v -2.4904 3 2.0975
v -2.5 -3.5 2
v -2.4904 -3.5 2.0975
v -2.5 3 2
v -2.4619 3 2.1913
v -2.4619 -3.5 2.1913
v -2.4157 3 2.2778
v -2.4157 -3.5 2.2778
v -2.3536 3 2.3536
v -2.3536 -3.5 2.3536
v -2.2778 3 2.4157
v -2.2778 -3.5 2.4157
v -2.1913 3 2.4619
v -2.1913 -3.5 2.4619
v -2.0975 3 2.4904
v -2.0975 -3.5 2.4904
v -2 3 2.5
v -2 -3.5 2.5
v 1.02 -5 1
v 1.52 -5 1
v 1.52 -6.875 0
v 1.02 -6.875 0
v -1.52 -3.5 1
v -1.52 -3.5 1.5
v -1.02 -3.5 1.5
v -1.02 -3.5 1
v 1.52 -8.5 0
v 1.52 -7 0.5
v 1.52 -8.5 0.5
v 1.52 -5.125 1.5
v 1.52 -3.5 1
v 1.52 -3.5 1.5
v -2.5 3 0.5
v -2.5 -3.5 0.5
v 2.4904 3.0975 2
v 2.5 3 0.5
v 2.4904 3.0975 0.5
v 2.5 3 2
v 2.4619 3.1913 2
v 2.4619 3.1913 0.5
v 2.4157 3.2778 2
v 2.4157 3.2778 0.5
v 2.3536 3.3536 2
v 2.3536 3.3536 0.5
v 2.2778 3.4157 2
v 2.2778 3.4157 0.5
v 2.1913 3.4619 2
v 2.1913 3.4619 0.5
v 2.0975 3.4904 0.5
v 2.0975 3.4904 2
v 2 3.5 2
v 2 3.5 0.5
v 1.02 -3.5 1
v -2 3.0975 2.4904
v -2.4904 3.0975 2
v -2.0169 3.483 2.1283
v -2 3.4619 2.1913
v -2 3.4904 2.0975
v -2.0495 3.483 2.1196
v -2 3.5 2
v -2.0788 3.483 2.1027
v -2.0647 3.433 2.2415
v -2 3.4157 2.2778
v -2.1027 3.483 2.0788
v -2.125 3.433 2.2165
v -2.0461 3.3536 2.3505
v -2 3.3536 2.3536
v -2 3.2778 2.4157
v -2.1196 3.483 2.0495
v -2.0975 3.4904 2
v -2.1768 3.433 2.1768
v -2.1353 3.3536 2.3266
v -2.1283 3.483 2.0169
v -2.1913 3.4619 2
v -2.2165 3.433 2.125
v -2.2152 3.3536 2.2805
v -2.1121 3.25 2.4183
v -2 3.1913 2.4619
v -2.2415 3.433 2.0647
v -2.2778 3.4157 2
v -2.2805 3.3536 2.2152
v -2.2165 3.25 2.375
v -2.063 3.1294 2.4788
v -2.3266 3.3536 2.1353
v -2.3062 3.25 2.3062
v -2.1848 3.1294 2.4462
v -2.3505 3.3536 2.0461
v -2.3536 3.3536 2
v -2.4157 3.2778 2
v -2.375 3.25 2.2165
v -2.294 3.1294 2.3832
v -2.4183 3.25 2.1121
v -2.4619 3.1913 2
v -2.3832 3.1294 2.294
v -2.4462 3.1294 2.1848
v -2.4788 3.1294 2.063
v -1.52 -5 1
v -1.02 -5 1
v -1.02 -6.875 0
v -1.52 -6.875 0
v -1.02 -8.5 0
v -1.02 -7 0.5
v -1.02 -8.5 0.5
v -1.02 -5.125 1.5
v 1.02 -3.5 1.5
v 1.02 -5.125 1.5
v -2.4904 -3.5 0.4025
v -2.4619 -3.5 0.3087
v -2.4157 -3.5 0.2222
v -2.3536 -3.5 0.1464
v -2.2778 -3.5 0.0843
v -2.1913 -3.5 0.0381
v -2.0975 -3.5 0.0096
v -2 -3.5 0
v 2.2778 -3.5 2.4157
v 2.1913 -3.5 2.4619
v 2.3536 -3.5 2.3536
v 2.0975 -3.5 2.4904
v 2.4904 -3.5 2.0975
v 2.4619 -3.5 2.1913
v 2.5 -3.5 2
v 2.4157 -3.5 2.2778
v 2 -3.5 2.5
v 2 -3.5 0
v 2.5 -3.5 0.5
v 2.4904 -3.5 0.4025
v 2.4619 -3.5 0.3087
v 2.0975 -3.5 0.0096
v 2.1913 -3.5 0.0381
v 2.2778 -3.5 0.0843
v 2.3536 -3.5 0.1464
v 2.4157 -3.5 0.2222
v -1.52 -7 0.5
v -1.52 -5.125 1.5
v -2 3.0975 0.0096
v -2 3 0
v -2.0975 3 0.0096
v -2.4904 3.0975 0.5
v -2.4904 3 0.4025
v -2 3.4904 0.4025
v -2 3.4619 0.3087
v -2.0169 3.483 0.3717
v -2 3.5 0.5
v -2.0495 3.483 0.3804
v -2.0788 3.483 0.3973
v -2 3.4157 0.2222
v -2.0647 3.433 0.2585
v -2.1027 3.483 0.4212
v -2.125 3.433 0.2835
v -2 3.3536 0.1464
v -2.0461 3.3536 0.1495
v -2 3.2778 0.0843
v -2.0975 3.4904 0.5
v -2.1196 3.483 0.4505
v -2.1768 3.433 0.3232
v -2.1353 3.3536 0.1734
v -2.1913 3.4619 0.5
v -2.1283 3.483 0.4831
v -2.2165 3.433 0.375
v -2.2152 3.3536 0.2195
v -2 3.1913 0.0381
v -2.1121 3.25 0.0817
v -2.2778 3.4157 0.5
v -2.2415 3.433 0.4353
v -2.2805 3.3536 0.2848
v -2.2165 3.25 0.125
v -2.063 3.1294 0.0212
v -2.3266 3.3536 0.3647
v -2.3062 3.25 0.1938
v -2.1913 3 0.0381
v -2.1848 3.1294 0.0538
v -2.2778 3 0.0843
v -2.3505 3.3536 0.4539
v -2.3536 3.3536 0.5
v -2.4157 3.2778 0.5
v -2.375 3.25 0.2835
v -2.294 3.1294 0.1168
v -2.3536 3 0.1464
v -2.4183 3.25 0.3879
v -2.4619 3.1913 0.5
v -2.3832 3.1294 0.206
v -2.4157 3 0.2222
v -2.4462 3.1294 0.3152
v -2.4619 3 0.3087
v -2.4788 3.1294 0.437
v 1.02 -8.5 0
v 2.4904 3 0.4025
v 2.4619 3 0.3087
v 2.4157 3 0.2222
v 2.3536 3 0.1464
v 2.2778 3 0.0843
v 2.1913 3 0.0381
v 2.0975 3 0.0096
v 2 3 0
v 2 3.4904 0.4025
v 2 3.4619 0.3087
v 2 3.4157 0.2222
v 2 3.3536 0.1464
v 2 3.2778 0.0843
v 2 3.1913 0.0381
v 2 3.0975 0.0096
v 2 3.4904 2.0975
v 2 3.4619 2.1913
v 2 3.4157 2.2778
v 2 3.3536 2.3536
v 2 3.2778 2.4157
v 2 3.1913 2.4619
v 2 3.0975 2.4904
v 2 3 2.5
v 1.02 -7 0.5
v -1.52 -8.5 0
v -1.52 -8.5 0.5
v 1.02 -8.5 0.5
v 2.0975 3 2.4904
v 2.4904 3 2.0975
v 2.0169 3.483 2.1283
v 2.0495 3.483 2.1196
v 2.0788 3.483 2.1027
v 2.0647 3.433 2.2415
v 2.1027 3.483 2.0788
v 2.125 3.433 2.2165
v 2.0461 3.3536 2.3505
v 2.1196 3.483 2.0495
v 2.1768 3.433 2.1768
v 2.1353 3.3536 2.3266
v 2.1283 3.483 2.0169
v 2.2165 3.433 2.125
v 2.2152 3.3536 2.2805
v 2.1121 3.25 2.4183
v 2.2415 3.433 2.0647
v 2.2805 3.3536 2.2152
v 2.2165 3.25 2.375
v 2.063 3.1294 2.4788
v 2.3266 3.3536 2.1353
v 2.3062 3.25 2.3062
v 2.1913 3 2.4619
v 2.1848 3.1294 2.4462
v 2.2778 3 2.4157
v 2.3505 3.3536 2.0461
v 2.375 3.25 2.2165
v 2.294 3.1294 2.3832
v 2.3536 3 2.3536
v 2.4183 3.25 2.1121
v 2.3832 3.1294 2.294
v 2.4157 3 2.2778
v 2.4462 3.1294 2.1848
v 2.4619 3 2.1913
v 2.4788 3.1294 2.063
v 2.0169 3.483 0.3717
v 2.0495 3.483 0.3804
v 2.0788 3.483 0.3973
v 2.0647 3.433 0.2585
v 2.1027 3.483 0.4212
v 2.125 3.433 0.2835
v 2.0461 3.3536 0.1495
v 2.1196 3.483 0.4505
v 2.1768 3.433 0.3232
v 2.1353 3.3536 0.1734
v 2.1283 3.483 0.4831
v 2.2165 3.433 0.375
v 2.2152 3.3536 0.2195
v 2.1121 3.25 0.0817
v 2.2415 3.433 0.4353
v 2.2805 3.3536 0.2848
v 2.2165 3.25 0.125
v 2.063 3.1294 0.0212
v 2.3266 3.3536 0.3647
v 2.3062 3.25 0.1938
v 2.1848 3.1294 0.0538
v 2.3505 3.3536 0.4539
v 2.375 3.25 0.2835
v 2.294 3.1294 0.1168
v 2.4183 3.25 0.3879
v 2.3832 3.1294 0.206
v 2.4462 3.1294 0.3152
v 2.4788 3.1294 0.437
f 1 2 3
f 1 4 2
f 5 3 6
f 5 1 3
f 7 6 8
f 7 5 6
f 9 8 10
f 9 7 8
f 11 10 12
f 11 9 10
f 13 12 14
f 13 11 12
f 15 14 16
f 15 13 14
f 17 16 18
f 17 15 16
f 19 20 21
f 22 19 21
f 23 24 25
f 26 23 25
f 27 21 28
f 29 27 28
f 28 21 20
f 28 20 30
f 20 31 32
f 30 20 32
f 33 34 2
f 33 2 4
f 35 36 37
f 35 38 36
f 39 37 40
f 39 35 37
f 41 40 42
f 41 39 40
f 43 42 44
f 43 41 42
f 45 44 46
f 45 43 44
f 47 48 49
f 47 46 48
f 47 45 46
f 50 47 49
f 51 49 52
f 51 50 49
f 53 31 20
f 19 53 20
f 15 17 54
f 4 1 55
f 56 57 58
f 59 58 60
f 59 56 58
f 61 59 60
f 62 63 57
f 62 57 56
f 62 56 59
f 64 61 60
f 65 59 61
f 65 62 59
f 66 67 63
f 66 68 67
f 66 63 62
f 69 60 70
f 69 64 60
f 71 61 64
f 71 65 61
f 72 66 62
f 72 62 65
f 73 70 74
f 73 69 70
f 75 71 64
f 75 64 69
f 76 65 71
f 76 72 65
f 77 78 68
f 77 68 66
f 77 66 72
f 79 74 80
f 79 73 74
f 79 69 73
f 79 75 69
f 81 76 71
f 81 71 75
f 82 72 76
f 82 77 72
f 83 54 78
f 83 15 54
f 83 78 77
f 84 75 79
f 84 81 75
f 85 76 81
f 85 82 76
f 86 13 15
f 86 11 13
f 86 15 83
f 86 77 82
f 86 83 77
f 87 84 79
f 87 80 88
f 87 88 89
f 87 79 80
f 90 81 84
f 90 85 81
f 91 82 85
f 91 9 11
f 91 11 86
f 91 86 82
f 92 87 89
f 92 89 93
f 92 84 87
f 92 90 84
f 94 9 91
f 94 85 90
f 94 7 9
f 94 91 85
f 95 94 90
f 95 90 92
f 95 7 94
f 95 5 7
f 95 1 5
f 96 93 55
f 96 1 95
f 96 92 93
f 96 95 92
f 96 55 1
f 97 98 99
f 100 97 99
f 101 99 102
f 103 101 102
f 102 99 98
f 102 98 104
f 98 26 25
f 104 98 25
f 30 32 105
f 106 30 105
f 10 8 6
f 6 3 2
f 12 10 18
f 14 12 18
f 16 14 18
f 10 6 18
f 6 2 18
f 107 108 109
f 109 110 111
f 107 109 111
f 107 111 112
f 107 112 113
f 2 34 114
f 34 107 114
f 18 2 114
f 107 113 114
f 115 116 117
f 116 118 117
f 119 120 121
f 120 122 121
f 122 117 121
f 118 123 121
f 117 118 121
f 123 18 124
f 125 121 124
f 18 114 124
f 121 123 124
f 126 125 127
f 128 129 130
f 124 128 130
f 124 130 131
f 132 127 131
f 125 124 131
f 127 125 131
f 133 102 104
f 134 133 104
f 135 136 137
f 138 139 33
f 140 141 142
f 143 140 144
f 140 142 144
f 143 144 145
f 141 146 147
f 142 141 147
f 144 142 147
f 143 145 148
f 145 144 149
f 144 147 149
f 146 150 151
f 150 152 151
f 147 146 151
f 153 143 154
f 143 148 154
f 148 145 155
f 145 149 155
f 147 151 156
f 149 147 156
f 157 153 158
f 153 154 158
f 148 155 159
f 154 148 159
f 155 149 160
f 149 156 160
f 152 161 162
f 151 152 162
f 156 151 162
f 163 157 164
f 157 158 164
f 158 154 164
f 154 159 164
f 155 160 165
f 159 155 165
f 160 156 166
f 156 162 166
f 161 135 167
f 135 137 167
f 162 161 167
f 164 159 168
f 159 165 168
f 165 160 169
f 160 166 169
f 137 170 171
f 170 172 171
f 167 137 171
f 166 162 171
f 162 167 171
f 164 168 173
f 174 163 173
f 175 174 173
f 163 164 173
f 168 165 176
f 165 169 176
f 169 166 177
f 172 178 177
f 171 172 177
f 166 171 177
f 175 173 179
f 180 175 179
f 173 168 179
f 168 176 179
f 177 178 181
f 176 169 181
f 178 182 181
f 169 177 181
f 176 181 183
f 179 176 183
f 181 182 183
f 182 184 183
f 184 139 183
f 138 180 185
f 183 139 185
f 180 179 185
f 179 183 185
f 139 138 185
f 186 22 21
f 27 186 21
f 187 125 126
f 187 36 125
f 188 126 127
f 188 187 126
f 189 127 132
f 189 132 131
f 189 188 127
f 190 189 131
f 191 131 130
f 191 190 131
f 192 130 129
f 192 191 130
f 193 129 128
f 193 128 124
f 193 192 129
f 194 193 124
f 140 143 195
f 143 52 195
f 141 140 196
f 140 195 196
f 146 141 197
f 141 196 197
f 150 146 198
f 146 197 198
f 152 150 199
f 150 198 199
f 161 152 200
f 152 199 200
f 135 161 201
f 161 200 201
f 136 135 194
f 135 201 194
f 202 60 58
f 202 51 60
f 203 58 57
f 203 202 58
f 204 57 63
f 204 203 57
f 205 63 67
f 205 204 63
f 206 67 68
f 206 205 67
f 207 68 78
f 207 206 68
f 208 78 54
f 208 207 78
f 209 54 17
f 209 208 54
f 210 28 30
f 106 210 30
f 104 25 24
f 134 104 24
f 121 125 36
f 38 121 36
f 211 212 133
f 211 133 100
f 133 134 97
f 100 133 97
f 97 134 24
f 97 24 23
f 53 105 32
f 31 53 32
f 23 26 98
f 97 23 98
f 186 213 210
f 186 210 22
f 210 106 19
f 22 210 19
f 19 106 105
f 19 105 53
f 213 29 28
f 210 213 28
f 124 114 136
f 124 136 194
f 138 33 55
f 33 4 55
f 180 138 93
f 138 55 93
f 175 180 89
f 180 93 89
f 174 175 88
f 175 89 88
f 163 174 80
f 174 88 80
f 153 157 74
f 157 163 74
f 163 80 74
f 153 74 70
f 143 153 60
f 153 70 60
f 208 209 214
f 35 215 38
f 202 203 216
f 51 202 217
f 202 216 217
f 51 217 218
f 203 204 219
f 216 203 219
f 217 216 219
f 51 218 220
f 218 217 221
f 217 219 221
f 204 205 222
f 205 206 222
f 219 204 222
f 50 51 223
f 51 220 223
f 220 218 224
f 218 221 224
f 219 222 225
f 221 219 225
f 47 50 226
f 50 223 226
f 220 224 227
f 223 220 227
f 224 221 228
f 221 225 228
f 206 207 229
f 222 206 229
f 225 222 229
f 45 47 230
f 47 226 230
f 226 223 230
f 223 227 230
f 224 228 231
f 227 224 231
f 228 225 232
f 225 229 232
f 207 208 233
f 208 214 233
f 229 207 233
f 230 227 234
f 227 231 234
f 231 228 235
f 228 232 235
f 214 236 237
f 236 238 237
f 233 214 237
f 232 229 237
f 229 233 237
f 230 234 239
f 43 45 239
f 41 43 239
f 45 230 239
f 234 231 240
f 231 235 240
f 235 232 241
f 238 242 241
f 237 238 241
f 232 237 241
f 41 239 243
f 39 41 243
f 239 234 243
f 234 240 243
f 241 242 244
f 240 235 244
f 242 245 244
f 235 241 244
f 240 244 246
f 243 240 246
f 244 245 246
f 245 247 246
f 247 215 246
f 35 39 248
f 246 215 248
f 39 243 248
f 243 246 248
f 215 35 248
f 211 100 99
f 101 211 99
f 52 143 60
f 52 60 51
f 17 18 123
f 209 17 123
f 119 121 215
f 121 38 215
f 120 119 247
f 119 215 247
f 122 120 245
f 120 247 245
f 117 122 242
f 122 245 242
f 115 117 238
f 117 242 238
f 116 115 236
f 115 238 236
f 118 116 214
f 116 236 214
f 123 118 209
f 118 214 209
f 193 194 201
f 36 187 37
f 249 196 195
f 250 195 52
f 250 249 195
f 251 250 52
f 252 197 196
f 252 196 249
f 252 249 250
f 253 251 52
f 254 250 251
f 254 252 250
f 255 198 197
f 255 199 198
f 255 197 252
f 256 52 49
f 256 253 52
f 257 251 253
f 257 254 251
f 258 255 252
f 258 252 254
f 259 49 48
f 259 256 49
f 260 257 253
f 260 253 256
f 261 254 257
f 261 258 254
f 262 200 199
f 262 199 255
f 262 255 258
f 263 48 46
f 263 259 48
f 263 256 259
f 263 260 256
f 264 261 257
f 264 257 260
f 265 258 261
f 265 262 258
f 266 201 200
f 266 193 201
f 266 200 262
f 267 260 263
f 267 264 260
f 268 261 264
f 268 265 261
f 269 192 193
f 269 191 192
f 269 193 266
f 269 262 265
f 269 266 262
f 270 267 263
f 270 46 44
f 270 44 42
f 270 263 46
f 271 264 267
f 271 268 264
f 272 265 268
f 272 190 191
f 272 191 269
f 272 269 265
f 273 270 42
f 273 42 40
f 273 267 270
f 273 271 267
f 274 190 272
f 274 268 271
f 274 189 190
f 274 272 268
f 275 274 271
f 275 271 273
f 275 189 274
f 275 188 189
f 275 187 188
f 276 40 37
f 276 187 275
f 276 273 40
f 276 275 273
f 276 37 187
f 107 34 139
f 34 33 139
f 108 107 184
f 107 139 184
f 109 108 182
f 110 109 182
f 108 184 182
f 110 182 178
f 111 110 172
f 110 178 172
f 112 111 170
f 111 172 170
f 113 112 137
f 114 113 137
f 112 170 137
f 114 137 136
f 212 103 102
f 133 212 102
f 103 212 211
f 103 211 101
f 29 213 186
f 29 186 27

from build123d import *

# Parameters (mm, degrees)
F0_W     = 5
F0_H     = 7
F1_DEPTH = 2.5
F3_R     = 0.5
F4_DEPTH = 5
F6_DEPTH = 4.021


with BuildPart() as f1:
    # F0 (on Top) → F1 (new body)
    with BuildSketch(Plane.XY):
        Rectangle(F0_W, F0_H)
    extrude(amount=F1_DEPTH)

    # F3
    f3_edges = [f1.edges().sort_by_distance(p)[0] for p in [
        (2.5, 0, 2.5),
        (2.5, 0, 0),
        (-2.5, 0, 0),
        (-2.5, 0, 2.5),
        (0, 3.5, 0),
        (0, 3.5, 2.5),
        (-2.5, 3.5, 1.25),
        (2.5, 3.5, 1.25),
    ]]
    fillet(f3_edges, radius=F3_R)


with BuildPart() as f4:
    # F2 (on face) → F4 (new body)
    with BuildSketch(Plane.XZ.offset(3.5)):
        Polygon((-1.02, 1), (-1.02, 1.5), (-1.52, 1.5), (-1.52, 1), (-1.52, 0), (-1.02, 0), align=None)
        Polygon((1.52, 1), (1.52, 1.5), (1.02, 1.5), (1.02, 1), (1.02, 0), (1.52, 0), align=None)
    extrude(amount=F4_DEPTH)

    # F5 (on face) → F6 (cut, through all)
    with BuildSketch(Plane.YZ.offset(1.52)):
        Polygon((-5.125, 1.5), (-8.5, 1.5), (-8.5, 1), (-8.5, 0.5), (-7, 0.5), (-6.0625, 1), align=None)
        Polygon((-5.9375, 0.5), (-6.875, 0), (-3.5, 0), (-3.5, 0.5), (-3.5, 1), (-5, 1), align=None)
    extrude(amount=-F6_DEPTH, mode=Mode.SUBTRACT)


solid = Compound([f1.part, f4.part])
